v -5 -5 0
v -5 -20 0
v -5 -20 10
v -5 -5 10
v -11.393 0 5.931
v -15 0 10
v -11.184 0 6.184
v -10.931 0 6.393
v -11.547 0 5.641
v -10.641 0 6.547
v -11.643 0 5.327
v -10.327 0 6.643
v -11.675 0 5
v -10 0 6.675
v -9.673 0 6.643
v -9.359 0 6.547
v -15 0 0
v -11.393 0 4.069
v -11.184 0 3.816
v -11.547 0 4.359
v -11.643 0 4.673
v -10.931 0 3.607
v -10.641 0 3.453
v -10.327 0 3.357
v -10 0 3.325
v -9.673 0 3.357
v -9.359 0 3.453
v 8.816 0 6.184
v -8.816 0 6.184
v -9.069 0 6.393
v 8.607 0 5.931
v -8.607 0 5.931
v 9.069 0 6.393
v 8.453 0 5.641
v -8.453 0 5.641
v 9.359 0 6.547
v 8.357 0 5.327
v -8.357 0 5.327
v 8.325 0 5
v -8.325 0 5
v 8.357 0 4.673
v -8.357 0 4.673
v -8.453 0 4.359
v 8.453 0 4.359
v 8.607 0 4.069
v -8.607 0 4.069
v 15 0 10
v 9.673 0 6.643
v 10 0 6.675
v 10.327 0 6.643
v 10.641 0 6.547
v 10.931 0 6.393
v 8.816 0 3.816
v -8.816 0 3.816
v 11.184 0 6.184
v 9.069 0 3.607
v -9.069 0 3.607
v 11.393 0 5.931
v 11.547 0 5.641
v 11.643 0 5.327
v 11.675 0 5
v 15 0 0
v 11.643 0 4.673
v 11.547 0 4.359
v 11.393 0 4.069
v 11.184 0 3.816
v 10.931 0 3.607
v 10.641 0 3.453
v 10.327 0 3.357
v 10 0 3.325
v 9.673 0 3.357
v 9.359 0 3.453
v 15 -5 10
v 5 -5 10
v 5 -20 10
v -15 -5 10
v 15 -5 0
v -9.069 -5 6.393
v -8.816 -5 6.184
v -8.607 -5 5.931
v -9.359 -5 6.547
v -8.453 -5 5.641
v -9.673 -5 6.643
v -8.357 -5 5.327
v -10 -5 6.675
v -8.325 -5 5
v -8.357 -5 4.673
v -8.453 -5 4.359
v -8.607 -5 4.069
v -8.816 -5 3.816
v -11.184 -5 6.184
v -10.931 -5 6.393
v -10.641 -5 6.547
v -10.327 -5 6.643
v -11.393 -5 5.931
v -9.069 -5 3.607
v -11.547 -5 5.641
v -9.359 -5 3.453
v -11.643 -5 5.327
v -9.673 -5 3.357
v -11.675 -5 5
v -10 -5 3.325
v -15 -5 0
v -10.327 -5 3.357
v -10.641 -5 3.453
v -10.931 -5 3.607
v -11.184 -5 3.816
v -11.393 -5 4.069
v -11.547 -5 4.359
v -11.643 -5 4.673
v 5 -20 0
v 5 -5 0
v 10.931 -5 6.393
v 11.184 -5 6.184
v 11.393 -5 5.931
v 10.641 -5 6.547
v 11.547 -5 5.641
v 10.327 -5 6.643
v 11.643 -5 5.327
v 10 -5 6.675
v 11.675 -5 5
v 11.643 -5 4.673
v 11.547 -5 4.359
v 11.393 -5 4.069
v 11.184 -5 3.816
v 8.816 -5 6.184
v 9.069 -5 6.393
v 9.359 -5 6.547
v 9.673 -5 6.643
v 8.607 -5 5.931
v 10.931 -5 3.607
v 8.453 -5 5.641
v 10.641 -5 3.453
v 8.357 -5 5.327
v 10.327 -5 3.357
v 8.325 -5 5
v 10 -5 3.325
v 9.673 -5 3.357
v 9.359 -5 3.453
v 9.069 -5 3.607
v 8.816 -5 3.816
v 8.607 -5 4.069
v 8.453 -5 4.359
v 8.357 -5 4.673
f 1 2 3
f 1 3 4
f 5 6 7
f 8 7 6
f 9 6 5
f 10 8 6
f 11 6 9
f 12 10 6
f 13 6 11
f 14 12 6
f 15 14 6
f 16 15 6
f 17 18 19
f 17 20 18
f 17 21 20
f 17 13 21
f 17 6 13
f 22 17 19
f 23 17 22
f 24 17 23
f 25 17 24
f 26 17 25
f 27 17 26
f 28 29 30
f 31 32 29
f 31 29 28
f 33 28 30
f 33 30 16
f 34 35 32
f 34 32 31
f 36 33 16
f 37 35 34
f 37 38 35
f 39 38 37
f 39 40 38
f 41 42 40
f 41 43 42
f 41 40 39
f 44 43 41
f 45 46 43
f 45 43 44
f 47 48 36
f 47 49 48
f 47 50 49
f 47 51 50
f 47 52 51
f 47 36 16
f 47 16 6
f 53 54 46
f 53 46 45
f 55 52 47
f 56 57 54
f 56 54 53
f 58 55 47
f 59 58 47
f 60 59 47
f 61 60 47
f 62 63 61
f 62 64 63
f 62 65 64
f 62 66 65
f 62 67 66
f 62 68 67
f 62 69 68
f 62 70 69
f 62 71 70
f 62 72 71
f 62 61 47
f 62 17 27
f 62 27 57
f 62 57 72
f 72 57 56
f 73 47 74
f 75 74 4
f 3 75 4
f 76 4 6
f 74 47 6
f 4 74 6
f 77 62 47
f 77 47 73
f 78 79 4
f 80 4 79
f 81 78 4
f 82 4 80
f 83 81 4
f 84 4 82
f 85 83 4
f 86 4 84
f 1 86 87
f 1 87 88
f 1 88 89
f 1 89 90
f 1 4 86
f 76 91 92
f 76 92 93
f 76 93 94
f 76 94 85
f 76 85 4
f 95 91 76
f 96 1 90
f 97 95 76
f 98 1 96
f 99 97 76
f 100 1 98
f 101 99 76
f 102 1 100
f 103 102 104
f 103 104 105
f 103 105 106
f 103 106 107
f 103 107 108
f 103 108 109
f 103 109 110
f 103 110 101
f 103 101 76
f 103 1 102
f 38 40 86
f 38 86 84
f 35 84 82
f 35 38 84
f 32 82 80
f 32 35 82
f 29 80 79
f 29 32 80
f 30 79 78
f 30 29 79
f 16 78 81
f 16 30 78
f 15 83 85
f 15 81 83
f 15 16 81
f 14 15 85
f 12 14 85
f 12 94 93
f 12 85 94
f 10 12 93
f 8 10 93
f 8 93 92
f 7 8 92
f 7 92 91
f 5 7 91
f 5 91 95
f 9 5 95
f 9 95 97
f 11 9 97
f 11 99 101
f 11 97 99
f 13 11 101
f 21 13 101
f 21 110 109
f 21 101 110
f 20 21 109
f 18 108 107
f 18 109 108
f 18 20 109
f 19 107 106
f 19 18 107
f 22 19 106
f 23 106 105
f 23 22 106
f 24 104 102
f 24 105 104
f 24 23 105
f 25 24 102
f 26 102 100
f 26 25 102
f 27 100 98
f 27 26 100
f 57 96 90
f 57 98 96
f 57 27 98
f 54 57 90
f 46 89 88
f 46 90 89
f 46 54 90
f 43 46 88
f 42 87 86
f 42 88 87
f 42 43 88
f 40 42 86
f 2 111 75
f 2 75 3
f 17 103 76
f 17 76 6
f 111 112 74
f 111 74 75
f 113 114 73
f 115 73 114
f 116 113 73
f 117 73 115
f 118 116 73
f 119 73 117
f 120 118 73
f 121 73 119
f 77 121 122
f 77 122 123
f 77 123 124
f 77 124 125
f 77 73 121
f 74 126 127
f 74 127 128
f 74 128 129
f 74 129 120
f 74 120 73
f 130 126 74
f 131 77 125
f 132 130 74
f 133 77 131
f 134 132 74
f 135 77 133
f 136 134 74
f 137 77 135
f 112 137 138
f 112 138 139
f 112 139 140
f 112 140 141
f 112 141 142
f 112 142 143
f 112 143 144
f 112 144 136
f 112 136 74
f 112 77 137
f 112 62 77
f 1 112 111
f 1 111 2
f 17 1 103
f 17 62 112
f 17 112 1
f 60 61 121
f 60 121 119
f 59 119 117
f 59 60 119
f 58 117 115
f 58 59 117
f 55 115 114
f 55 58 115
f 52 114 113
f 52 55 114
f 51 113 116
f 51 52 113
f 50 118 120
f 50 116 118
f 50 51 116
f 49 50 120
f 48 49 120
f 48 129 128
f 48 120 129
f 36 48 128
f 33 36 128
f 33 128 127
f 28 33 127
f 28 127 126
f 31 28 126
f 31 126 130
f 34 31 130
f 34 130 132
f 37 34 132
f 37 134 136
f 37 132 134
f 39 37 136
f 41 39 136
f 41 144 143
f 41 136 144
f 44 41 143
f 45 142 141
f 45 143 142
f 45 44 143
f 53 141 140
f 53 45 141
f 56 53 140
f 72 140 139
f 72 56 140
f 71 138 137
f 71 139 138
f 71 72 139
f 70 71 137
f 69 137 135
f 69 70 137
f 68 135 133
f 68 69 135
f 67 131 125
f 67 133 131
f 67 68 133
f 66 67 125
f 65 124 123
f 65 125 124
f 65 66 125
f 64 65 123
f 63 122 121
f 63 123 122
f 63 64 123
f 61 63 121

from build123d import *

# Parameters (mm, degrees)
EXTRUDE_1_DEPTH          = 10
CUT_EXTRUDE_1_DEPTH      = 24.452078799
CUT_EXTRUDE_1_DEPTH_BACK = 24.452078799
SKETCH_2_R               = 1.674991146


with BuildPart() as part:
    # ｽｹｯﾁ1 → ﾎﾞｽ - 押し出し1 (new body)
    with BuildSketch(Plane.XY):
        Polygon((-15, 0), (15, 0), (15, -5), (5, -5), (5, -20), (-5, -20), (-5, -5), (-15, -5), align=None)
    extrude(amount=EXTRUDE_1_DEPTH)

    # ｽｹｯﾁ2 → ｶｯﾄ - 押し出し1 (cut, two sides: drawn at the far end of the back side and taken through both)
    with BuildSketch(Plane.XZ.offset(5).offset(-CUT_EXTRUDE_1_DEPTH_BACK)):
        with Locations((-10, 5)):
            Circle(SKETCH_2_R)
        with Locations((10, 5)):
            Circle(SKETCH_2_R)
    extrude(amount=CUT_EXTRUDE_1_DEPTH + CUT_EXTRUDE_1_DEPTH_BACK, mode=Mode.SUBTRACT)


solid = part.part
